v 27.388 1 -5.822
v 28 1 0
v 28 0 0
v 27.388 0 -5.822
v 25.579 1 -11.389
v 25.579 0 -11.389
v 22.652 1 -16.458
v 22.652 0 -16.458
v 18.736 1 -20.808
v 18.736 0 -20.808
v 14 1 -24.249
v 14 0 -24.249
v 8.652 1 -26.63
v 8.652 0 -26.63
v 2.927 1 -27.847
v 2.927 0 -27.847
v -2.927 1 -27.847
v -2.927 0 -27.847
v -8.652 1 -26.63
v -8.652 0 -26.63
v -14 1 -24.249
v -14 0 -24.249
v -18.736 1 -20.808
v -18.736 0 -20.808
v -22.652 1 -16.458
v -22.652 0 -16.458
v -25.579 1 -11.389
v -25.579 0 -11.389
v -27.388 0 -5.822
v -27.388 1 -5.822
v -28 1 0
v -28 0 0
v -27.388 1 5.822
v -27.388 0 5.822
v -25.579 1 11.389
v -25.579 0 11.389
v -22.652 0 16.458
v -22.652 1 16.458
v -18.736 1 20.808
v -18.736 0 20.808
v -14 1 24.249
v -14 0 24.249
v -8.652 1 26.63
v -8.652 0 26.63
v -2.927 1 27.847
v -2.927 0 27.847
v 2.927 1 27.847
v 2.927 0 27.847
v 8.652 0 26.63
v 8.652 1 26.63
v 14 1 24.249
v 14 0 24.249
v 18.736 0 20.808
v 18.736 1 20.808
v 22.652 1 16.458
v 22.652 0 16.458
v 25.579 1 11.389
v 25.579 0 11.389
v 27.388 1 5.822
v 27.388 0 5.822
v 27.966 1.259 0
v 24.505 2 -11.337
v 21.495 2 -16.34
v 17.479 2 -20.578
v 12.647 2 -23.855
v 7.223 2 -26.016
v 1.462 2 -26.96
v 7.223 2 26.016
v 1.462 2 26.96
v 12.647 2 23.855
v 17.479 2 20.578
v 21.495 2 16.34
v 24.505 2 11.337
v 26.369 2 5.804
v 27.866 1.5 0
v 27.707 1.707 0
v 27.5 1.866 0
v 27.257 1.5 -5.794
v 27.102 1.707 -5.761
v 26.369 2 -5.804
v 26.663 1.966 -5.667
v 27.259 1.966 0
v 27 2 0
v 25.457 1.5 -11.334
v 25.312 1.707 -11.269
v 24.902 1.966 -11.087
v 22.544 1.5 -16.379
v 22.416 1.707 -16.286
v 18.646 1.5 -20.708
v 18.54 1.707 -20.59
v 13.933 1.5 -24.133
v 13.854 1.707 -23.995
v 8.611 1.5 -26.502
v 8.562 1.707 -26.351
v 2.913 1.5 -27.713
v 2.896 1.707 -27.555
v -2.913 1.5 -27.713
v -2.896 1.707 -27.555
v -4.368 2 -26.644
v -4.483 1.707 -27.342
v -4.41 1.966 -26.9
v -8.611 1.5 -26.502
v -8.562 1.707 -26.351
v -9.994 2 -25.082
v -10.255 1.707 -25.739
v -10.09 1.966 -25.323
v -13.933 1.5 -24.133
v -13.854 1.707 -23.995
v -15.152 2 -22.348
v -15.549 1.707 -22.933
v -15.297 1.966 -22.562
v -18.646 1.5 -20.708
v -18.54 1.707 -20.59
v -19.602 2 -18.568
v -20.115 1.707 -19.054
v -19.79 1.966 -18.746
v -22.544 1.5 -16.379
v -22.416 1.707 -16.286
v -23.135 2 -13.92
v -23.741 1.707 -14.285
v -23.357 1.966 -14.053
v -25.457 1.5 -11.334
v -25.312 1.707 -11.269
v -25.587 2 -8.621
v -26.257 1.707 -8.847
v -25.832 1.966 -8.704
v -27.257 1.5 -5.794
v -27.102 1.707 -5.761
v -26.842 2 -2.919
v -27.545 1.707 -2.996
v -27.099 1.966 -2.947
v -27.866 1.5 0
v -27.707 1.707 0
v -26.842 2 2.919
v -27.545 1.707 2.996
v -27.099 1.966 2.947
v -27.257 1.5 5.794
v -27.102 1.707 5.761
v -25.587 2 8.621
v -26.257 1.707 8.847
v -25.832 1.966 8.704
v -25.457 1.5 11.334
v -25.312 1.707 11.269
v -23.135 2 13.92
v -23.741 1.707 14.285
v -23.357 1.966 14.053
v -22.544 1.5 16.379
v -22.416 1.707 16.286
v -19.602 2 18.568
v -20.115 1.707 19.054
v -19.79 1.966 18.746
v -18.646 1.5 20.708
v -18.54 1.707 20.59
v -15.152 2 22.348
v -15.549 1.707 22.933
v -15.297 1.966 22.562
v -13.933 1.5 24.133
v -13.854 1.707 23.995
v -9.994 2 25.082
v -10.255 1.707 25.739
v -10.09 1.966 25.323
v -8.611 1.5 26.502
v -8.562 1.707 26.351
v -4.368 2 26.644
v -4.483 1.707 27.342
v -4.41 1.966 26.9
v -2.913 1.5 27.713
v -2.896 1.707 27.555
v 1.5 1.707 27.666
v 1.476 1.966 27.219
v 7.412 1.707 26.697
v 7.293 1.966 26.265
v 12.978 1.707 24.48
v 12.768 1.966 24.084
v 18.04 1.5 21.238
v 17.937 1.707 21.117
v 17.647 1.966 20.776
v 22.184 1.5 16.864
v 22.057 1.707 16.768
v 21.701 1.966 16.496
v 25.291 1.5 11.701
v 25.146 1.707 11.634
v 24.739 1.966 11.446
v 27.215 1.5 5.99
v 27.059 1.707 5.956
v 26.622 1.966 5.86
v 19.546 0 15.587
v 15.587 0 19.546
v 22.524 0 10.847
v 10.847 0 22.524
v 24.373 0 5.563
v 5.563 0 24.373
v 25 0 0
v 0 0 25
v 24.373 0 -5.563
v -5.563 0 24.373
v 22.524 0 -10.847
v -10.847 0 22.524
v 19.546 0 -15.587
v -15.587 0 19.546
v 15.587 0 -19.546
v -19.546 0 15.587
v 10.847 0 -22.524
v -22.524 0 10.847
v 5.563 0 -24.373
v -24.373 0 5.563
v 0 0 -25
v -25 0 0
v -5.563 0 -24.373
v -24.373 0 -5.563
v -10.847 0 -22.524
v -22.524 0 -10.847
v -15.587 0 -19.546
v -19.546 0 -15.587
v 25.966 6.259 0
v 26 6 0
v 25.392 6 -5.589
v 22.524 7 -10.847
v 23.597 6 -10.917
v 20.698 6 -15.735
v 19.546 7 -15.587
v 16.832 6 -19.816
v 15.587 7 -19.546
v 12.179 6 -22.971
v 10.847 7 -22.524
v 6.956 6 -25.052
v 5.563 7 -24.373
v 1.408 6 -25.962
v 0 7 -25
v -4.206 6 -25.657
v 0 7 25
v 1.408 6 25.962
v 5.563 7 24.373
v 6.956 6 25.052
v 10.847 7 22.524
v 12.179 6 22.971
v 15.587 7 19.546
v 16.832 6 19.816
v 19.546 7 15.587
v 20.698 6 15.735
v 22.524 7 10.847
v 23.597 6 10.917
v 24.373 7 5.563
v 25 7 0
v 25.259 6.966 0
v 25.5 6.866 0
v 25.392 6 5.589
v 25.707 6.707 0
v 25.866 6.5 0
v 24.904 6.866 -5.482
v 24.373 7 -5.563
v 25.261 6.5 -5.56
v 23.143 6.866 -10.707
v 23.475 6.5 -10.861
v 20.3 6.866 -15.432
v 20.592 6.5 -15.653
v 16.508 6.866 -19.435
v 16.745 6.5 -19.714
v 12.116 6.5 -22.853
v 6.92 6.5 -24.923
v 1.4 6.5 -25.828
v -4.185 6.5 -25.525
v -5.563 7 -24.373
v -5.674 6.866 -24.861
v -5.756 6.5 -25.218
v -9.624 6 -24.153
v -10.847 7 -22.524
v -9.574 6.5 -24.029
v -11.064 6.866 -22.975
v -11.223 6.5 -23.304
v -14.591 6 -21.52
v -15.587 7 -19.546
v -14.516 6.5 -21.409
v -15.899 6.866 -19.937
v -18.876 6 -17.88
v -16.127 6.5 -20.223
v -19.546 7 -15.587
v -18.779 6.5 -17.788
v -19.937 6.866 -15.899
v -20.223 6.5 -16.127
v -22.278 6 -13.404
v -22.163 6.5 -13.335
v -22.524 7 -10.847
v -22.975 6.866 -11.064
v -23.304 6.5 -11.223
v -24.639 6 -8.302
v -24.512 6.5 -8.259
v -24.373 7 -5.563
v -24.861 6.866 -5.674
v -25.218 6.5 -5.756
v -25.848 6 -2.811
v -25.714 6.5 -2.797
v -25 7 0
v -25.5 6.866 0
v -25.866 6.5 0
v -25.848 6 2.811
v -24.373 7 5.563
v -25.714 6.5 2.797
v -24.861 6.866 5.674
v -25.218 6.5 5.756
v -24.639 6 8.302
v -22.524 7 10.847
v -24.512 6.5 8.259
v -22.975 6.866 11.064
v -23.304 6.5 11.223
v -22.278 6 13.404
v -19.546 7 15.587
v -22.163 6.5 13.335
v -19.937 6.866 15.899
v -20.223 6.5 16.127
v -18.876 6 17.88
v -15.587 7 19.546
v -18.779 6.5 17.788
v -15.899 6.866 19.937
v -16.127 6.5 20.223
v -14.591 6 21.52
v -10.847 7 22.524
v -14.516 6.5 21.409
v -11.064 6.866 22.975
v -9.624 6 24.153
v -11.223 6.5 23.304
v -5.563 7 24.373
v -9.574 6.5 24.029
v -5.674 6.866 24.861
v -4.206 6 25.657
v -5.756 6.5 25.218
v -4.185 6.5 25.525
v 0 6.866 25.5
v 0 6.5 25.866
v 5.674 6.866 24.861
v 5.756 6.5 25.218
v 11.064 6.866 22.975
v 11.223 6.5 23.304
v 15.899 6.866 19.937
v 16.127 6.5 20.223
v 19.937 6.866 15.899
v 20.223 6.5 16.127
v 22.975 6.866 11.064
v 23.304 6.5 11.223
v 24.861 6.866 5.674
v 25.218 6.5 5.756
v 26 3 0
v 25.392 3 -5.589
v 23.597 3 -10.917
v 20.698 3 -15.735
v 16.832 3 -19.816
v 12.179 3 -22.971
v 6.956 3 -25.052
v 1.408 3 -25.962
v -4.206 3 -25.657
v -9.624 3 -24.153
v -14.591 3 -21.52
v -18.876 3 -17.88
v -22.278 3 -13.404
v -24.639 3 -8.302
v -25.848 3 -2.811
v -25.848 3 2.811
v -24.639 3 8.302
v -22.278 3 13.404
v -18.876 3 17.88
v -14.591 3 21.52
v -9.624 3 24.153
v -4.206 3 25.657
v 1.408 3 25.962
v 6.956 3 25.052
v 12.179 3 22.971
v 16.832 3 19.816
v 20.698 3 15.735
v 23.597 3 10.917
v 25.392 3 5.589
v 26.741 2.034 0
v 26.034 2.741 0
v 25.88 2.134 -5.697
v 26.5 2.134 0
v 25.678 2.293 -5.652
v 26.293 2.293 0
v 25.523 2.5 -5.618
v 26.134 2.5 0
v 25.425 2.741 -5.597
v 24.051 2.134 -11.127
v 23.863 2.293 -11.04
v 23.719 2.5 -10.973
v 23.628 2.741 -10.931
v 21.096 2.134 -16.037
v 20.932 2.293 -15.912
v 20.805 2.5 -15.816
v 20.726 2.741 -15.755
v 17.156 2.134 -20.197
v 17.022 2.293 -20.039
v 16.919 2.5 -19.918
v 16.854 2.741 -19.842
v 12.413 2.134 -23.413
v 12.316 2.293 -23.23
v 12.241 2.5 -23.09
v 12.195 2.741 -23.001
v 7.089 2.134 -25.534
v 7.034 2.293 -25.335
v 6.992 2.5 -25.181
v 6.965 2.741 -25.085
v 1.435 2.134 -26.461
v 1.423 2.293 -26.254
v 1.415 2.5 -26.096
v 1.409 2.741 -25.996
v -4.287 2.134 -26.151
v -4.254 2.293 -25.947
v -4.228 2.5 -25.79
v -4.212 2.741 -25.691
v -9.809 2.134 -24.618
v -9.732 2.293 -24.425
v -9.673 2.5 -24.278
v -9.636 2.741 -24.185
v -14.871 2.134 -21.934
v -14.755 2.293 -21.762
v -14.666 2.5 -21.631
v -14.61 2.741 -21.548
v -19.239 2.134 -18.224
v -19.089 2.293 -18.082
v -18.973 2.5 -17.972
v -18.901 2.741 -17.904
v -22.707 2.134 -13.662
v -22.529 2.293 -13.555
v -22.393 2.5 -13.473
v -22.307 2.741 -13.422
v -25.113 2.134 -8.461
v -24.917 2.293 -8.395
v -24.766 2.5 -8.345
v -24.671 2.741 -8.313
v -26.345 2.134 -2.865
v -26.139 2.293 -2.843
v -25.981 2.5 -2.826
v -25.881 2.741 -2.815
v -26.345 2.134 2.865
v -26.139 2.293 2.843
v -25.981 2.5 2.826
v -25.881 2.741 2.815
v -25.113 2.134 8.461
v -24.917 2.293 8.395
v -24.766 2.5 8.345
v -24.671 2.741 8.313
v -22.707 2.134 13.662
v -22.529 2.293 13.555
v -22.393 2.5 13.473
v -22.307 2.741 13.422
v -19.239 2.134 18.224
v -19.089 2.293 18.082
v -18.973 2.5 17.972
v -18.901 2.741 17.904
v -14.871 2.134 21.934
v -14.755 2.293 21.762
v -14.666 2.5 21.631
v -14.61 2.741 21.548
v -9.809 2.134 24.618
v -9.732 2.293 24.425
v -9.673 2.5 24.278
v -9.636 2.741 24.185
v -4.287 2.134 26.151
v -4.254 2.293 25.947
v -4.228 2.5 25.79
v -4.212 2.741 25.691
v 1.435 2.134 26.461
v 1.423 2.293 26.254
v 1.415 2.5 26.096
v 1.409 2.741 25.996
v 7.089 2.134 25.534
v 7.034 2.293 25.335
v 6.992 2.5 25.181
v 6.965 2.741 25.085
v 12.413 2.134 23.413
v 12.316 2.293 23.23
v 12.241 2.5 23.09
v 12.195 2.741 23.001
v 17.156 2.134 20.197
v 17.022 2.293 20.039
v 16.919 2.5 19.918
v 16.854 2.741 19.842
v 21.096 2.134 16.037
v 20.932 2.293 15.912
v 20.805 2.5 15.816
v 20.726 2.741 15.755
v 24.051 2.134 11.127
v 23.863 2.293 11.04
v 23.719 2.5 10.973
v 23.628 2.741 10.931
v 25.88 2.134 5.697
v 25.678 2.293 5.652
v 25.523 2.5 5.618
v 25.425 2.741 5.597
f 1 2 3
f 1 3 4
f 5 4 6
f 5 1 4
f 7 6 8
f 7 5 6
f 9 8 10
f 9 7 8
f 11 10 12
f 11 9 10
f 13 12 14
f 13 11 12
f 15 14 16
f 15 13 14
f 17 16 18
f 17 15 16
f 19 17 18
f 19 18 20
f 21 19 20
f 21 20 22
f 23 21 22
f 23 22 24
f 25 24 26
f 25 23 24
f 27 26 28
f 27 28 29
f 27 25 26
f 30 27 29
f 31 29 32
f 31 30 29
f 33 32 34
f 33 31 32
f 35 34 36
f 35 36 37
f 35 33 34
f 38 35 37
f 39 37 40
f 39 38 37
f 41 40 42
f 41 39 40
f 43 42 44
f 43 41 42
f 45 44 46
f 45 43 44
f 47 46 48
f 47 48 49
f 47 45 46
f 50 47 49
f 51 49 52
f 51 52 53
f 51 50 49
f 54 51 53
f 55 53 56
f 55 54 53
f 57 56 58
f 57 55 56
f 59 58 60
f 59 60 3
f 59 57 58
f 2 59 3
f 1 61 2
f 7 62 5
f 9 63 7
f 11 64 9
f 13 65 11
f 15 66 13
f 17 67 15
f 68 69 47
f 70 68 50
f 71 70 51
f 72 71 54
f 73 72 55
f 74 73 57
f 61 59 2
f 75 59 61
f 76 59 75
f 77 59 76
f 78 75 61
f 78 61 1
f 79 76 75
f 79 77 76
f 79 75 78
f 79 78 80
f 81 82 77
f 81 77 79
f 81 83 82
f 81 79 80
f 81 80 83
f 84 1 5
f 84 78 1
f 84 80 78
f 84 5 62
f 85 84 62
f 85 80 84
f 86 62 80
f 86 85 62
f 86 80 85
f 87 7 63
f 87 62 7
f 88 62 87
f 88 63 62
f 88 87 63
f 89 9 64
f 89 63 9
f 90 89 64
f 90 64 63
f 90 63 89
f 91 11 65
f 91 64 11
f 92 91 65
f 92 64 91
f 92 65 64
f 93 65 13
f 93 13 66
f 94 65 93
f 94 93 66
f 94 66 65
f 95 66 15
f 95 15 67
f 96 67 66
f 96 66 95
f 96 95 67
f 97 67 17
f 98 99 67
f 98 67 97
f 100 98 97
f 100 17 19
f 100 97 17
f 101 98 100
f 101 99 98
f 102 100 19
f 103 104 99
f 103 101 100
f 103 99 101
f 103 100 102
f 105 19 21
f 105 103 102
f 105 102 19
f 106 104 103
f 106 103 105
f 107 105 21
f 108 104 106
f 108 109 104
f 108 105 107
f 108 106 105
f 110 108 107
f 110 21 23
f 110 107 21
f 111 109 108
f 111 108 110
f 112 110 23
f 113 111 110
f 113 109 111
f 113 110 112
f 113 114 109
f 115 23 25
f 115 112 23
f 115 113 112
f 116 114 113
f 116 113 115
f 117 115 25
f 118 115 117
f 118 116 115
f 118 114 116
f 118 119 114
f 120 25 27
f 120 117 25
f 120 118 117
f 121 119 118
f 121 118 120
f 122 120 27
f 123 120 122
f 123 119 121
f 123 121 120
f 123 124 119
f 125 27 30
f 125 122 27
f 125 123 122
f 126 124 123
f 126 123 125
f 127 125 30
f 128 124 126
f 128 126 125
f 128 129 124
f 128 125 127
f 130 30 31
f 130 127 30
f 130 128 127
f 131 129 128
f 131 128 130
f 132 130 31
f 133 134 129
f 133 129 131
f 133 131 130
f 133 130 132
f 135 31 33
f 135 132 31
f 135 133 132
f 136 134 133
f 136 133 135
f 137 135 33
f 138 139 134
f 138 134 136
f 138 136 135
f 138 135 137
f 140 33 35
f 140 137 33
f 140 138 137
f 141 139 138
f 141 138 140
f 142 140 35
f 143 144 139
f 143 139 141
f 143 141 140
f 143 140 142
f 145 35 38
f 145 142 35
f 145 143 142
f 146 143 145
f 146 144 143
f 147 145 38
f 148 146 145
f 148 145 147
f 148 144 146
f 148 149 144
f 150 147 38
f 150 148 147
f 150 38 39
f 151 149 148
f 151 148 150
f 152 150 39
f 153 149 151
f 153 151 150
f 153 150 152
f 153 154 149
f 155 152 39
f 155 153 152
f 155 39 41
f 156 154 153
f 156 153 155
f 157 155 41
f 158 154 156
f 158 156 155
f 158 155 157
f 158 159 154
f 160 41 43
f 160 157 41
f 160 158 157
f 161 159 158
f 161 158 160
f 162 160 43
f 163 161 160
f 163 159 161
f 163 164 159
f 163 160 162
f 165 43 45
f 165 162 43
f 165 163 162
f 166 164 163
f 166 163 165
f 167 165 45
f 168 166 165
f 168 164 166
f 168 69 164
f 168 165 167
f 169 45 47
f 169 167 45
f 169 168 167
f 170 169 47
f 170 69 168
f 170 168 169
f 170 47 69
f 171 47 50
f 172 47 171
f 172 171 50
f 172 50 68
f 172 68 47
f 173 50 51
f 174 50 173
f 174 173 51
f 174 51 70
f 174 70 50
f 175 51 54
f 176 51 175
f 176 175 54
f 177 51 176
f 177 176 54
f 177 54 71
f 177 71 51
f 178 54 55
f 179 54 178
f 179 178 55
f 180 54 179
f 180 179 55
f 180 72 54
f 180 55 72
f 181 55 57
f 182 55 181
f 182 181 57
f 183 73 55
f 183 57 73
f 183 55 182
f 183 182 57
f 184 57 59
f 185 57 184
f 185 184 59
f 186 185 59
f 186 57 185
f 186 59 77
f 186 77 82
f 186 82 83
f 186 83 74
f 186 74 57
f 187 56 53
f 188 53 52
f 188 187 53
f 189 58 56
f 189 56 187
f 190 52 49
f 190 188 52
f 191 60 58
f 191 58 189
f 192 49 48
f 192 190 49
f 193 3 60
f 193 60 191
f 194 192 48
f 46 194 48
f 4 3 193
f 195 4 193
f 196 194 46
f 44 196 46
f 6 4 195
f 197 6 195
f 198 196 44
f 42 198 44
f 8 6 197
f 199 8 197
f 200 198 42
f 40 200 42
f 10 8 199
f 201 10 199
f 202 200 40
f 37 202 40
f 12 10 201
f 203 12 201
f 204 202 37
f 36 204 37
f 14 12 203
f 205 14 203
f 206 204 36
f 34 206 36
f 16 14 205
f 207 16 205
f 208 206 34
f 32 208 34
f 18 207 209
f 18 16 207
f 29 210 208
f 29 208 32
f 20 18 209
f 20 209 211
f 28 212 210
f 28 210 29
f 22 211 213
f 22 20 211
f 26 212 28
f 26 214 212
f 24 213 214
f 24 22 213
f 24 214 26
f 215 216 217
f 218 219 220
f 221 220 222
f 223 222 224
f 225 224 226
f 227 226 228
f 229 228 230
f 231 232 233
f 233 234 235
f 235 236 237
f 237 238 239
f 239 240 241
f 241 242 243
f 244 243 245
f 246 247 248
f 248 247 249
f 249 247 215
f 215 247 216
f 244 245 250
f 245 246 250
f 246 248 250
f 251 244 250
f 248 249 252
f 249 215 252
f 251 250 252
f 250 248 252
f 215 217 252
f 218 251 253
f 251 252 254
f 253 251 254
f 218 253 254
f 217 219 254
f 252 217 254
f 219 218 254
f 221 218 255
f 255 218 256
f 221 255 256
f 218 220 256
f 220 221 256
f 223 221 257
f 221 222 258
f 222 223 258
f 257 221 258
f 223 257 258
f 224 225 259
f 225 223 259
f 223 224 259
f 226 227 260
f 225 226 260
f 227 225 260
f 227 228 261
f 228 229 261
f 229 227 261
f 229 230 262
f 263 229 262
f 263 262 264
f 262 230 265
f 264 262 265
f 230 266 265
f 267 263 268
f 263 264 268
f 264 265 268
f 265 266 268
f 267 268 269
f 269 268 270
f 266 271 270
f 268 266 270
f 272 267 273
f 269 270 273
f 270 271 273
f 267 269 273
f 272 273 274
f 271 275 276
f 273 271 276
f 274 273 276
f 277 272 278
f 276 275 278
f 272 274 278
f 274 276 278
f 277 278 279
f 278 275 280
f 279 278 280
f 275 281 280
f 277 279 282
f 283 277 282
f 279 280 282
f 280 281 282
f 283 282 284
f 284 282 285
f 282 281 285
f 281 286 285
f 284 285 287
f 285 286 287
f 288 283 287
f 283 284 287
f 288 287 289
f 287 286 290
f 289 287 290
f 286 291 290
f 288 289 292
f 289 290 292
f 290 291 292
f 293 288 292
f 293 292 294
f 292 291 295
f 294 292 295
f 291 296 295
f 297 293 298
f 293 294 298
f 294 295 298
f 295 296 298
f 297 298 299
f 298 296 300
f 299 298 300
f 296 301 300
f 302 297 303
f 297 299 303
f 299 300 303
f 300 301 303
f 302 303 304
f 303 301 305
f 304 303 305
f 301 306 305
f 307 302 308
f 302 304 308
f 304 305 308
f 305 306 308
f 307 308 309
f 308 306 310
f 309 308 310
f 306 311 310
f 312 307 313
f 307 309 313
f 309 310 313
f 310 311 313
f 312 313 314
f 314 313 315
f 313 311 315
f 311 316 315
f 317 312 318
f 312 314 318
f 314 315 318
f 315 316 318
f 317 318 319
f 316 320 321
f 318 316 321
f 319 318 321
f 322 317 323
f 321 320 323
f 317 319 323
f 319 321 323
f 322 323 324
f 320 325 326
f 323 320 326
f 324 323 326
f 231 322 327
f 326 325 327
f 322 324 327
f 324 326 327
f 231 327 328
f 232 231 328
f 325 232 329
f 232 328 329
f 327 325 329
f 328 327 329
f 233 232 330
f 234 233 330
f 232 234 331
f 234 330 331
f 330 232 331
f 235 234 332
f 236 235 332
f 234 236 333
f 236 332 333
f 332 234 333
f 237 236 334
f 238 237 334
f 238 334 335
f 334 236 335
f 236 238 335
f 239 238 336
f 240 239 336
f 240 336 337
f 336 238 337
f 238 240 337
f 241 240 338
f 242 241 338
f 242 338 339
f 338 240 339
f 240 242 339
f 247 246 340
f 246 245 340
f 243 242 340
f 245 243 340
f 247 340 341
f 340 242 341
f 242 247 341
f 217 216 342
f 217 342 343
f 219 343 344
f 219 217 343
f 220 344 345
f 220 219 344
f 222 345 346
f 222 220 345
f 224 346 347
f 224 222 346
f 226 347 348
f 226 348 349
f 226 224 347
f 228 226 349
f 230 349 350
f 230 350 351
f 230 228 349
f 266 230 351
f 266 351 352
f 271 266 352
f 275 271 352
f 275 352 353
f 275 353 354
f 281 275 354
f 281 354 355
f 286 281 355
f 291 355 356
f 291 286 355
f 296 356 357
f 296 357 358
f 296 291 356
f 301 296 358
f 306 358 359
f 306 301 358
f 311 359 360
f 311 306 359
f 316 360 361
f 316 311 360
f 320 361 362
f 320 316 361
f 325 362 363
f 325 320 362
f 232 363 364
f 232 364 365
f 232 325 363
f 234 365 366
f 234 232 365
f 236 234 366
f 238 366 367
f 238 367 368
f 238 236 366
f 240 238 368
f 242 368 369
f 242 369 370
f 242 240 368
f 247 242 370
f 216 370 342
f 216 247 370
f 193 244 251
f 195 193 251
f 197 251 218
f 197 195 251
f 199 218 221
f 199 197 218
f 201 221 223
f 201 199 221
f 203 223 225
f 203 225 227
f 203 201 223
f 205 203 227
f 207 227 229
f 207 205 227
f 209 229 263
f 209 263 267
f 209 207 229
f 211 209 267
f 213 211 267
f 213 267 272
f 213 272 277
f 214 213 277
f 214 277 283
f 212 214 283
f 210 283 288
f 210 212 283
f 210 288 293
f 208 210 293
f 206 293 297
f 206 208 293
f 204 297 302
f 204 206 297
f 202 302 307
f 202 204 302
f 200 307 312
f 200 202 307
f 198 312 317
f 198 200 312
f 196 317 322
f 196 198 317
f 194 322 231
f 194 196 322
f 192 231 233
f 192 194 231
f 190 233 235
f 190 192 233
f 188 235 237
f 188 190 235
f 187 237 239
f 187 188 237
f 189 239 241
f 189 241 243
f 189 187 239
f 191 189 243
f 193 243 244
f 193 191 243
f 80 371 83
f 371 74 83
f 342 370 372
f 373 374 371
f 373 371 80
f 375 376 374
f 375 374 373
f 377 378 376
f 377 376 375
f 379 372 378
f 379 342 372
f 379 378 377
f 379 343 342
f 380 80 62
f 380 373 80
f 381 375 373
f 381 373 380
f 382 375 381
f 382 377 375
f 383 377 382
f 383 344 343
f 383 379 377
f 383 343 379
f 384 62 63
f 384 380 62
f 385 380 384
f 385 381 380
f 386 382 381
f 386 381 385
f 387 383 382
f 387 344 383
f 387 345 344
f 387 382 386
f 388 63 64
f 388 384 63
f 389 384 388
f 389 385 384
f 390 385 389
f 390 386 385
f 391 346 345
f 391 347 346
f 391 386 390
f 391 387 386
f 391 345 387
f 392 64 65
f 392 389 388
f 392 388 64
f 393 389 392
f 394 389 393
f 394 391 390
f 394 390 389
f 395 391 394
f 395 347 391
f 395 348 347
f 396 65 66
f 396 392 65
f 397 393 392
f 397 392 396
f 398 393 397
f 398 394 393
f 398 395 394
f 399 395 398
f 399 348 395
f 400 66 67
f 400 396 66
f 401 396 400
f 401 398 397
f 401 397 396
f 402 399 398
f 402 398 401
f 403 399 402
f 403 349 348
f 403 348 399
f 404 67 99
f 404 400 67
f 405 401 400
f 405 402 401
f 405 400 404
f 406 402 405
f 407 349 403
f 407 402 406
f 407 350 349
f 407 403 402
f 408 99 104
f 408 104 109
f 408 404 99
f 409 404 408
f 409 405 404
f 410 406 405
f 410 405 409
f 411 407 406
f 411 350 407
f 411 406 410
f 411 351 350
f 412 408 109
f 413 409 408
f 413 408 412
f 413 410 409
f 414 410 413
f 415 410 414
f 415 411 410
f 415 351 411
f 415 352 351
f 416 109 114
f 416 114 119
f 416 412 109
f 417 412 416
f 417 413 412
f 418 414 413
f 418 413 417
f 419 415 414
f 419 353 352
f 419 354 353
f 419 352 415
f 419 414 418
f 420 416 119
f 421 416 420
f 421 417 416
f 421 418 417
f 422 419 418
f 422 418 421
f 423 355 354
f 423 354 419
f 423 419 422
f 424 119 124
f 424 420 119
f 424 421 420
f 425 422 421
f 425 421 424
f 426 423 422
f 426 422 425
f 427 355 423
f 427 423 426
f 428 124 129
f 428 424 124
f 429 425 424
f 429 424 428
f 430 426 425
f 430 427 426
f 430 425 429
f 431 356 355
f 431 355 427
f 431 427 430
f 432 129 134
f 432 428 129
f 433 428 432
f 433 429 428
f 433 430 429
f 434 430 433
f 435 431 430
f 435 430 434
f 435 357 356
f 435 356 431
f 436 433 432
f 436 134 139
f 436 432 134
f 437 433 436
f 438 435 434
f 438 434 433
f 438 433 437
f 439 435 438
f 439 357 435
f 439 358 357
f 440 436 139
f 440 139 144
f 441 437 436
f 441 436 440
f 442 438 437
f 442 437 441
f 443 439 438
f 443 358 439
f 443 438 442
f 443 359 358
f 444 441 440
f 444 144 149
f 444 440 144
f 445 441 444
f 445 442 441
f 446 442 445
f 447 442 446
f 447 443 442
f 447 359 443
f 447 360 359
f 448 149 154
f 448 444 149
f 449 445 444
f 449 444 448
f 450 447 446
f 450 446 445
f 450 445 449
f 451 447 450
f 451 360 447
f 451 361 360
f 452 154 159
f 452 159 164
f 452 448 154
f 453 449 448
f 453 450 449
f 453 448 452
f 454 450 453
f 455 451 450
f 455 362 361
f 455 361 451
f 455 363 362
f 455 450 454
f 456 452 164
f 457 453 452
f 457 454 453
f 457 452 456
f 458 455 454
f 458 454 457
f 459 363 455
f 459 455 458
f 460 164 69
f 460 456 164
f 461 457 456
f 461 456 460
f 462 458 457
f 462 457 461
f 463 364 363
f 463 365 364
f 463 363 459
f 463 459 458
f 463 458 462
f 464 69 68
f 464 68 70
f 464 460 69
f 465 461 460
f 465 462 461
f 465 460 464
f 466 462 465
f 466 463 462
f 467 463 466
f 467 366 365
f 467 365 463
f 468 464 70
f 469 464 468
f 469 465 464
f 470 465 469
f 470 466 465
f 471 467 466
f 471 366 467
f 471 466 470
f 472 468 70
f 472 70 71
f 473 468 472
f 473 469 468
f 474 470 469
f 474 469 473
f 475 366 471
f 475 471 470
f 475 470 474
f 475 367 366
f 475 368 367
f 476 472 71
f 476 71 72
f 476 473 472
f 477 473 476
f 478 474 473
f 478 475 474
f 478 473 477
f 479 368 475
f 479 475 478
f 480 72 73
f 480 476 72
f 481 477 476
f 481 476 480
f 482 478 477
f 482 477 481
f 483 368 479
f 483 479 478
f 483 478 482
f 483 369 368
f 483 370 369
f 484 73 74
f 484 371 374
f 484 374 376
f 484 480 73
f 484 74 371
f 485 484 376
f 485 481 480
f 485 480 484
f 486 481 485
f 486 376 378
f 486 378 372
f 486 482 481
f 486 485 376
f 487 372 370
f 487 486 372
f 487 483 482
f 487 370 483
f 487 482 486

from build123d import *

# Parameters (mm, degrees)
F2_R = 0.99999
F3_R = 0.99999


# Not quite as in the source:
# - a fillet or chamfer is up to 0.001 mm smaller than in the source, because OpenCascade refuses the exact size


with BuildPart() as f1:
    # F0 (on Top) → F1 (revolve)
    with BuildSketch(Plane.XY):
        Polygon((25, 7), (25, 0), (28, 0), (28, 2), (26, 2), (26, 7), align=None)
    revolve(axis=Axis((0, 6.8999978745, 0), (0, 1, 0)))

    # F2 (radius 1 in the source; OpenCascade refuses exactly that, so slightly less here)
    f2_edges = [f1.edges().sort_by_distance(p)[0] for p in [
        (-26, 2, 0),
        (-28, 2, 0),
    ]]
    fillet(f2_edges, radius=F2_R)

    # F3 (radius 1 in the source; OpenCascade refuses exactly that, so slightly less here)
    f3_edges = [f1.edges().sort_by_distance(p)[0] for p in [
        (-26, 7, 0),
    ]]
    fillet(f3_edges, radius=F3_R)


solid = f1.part
